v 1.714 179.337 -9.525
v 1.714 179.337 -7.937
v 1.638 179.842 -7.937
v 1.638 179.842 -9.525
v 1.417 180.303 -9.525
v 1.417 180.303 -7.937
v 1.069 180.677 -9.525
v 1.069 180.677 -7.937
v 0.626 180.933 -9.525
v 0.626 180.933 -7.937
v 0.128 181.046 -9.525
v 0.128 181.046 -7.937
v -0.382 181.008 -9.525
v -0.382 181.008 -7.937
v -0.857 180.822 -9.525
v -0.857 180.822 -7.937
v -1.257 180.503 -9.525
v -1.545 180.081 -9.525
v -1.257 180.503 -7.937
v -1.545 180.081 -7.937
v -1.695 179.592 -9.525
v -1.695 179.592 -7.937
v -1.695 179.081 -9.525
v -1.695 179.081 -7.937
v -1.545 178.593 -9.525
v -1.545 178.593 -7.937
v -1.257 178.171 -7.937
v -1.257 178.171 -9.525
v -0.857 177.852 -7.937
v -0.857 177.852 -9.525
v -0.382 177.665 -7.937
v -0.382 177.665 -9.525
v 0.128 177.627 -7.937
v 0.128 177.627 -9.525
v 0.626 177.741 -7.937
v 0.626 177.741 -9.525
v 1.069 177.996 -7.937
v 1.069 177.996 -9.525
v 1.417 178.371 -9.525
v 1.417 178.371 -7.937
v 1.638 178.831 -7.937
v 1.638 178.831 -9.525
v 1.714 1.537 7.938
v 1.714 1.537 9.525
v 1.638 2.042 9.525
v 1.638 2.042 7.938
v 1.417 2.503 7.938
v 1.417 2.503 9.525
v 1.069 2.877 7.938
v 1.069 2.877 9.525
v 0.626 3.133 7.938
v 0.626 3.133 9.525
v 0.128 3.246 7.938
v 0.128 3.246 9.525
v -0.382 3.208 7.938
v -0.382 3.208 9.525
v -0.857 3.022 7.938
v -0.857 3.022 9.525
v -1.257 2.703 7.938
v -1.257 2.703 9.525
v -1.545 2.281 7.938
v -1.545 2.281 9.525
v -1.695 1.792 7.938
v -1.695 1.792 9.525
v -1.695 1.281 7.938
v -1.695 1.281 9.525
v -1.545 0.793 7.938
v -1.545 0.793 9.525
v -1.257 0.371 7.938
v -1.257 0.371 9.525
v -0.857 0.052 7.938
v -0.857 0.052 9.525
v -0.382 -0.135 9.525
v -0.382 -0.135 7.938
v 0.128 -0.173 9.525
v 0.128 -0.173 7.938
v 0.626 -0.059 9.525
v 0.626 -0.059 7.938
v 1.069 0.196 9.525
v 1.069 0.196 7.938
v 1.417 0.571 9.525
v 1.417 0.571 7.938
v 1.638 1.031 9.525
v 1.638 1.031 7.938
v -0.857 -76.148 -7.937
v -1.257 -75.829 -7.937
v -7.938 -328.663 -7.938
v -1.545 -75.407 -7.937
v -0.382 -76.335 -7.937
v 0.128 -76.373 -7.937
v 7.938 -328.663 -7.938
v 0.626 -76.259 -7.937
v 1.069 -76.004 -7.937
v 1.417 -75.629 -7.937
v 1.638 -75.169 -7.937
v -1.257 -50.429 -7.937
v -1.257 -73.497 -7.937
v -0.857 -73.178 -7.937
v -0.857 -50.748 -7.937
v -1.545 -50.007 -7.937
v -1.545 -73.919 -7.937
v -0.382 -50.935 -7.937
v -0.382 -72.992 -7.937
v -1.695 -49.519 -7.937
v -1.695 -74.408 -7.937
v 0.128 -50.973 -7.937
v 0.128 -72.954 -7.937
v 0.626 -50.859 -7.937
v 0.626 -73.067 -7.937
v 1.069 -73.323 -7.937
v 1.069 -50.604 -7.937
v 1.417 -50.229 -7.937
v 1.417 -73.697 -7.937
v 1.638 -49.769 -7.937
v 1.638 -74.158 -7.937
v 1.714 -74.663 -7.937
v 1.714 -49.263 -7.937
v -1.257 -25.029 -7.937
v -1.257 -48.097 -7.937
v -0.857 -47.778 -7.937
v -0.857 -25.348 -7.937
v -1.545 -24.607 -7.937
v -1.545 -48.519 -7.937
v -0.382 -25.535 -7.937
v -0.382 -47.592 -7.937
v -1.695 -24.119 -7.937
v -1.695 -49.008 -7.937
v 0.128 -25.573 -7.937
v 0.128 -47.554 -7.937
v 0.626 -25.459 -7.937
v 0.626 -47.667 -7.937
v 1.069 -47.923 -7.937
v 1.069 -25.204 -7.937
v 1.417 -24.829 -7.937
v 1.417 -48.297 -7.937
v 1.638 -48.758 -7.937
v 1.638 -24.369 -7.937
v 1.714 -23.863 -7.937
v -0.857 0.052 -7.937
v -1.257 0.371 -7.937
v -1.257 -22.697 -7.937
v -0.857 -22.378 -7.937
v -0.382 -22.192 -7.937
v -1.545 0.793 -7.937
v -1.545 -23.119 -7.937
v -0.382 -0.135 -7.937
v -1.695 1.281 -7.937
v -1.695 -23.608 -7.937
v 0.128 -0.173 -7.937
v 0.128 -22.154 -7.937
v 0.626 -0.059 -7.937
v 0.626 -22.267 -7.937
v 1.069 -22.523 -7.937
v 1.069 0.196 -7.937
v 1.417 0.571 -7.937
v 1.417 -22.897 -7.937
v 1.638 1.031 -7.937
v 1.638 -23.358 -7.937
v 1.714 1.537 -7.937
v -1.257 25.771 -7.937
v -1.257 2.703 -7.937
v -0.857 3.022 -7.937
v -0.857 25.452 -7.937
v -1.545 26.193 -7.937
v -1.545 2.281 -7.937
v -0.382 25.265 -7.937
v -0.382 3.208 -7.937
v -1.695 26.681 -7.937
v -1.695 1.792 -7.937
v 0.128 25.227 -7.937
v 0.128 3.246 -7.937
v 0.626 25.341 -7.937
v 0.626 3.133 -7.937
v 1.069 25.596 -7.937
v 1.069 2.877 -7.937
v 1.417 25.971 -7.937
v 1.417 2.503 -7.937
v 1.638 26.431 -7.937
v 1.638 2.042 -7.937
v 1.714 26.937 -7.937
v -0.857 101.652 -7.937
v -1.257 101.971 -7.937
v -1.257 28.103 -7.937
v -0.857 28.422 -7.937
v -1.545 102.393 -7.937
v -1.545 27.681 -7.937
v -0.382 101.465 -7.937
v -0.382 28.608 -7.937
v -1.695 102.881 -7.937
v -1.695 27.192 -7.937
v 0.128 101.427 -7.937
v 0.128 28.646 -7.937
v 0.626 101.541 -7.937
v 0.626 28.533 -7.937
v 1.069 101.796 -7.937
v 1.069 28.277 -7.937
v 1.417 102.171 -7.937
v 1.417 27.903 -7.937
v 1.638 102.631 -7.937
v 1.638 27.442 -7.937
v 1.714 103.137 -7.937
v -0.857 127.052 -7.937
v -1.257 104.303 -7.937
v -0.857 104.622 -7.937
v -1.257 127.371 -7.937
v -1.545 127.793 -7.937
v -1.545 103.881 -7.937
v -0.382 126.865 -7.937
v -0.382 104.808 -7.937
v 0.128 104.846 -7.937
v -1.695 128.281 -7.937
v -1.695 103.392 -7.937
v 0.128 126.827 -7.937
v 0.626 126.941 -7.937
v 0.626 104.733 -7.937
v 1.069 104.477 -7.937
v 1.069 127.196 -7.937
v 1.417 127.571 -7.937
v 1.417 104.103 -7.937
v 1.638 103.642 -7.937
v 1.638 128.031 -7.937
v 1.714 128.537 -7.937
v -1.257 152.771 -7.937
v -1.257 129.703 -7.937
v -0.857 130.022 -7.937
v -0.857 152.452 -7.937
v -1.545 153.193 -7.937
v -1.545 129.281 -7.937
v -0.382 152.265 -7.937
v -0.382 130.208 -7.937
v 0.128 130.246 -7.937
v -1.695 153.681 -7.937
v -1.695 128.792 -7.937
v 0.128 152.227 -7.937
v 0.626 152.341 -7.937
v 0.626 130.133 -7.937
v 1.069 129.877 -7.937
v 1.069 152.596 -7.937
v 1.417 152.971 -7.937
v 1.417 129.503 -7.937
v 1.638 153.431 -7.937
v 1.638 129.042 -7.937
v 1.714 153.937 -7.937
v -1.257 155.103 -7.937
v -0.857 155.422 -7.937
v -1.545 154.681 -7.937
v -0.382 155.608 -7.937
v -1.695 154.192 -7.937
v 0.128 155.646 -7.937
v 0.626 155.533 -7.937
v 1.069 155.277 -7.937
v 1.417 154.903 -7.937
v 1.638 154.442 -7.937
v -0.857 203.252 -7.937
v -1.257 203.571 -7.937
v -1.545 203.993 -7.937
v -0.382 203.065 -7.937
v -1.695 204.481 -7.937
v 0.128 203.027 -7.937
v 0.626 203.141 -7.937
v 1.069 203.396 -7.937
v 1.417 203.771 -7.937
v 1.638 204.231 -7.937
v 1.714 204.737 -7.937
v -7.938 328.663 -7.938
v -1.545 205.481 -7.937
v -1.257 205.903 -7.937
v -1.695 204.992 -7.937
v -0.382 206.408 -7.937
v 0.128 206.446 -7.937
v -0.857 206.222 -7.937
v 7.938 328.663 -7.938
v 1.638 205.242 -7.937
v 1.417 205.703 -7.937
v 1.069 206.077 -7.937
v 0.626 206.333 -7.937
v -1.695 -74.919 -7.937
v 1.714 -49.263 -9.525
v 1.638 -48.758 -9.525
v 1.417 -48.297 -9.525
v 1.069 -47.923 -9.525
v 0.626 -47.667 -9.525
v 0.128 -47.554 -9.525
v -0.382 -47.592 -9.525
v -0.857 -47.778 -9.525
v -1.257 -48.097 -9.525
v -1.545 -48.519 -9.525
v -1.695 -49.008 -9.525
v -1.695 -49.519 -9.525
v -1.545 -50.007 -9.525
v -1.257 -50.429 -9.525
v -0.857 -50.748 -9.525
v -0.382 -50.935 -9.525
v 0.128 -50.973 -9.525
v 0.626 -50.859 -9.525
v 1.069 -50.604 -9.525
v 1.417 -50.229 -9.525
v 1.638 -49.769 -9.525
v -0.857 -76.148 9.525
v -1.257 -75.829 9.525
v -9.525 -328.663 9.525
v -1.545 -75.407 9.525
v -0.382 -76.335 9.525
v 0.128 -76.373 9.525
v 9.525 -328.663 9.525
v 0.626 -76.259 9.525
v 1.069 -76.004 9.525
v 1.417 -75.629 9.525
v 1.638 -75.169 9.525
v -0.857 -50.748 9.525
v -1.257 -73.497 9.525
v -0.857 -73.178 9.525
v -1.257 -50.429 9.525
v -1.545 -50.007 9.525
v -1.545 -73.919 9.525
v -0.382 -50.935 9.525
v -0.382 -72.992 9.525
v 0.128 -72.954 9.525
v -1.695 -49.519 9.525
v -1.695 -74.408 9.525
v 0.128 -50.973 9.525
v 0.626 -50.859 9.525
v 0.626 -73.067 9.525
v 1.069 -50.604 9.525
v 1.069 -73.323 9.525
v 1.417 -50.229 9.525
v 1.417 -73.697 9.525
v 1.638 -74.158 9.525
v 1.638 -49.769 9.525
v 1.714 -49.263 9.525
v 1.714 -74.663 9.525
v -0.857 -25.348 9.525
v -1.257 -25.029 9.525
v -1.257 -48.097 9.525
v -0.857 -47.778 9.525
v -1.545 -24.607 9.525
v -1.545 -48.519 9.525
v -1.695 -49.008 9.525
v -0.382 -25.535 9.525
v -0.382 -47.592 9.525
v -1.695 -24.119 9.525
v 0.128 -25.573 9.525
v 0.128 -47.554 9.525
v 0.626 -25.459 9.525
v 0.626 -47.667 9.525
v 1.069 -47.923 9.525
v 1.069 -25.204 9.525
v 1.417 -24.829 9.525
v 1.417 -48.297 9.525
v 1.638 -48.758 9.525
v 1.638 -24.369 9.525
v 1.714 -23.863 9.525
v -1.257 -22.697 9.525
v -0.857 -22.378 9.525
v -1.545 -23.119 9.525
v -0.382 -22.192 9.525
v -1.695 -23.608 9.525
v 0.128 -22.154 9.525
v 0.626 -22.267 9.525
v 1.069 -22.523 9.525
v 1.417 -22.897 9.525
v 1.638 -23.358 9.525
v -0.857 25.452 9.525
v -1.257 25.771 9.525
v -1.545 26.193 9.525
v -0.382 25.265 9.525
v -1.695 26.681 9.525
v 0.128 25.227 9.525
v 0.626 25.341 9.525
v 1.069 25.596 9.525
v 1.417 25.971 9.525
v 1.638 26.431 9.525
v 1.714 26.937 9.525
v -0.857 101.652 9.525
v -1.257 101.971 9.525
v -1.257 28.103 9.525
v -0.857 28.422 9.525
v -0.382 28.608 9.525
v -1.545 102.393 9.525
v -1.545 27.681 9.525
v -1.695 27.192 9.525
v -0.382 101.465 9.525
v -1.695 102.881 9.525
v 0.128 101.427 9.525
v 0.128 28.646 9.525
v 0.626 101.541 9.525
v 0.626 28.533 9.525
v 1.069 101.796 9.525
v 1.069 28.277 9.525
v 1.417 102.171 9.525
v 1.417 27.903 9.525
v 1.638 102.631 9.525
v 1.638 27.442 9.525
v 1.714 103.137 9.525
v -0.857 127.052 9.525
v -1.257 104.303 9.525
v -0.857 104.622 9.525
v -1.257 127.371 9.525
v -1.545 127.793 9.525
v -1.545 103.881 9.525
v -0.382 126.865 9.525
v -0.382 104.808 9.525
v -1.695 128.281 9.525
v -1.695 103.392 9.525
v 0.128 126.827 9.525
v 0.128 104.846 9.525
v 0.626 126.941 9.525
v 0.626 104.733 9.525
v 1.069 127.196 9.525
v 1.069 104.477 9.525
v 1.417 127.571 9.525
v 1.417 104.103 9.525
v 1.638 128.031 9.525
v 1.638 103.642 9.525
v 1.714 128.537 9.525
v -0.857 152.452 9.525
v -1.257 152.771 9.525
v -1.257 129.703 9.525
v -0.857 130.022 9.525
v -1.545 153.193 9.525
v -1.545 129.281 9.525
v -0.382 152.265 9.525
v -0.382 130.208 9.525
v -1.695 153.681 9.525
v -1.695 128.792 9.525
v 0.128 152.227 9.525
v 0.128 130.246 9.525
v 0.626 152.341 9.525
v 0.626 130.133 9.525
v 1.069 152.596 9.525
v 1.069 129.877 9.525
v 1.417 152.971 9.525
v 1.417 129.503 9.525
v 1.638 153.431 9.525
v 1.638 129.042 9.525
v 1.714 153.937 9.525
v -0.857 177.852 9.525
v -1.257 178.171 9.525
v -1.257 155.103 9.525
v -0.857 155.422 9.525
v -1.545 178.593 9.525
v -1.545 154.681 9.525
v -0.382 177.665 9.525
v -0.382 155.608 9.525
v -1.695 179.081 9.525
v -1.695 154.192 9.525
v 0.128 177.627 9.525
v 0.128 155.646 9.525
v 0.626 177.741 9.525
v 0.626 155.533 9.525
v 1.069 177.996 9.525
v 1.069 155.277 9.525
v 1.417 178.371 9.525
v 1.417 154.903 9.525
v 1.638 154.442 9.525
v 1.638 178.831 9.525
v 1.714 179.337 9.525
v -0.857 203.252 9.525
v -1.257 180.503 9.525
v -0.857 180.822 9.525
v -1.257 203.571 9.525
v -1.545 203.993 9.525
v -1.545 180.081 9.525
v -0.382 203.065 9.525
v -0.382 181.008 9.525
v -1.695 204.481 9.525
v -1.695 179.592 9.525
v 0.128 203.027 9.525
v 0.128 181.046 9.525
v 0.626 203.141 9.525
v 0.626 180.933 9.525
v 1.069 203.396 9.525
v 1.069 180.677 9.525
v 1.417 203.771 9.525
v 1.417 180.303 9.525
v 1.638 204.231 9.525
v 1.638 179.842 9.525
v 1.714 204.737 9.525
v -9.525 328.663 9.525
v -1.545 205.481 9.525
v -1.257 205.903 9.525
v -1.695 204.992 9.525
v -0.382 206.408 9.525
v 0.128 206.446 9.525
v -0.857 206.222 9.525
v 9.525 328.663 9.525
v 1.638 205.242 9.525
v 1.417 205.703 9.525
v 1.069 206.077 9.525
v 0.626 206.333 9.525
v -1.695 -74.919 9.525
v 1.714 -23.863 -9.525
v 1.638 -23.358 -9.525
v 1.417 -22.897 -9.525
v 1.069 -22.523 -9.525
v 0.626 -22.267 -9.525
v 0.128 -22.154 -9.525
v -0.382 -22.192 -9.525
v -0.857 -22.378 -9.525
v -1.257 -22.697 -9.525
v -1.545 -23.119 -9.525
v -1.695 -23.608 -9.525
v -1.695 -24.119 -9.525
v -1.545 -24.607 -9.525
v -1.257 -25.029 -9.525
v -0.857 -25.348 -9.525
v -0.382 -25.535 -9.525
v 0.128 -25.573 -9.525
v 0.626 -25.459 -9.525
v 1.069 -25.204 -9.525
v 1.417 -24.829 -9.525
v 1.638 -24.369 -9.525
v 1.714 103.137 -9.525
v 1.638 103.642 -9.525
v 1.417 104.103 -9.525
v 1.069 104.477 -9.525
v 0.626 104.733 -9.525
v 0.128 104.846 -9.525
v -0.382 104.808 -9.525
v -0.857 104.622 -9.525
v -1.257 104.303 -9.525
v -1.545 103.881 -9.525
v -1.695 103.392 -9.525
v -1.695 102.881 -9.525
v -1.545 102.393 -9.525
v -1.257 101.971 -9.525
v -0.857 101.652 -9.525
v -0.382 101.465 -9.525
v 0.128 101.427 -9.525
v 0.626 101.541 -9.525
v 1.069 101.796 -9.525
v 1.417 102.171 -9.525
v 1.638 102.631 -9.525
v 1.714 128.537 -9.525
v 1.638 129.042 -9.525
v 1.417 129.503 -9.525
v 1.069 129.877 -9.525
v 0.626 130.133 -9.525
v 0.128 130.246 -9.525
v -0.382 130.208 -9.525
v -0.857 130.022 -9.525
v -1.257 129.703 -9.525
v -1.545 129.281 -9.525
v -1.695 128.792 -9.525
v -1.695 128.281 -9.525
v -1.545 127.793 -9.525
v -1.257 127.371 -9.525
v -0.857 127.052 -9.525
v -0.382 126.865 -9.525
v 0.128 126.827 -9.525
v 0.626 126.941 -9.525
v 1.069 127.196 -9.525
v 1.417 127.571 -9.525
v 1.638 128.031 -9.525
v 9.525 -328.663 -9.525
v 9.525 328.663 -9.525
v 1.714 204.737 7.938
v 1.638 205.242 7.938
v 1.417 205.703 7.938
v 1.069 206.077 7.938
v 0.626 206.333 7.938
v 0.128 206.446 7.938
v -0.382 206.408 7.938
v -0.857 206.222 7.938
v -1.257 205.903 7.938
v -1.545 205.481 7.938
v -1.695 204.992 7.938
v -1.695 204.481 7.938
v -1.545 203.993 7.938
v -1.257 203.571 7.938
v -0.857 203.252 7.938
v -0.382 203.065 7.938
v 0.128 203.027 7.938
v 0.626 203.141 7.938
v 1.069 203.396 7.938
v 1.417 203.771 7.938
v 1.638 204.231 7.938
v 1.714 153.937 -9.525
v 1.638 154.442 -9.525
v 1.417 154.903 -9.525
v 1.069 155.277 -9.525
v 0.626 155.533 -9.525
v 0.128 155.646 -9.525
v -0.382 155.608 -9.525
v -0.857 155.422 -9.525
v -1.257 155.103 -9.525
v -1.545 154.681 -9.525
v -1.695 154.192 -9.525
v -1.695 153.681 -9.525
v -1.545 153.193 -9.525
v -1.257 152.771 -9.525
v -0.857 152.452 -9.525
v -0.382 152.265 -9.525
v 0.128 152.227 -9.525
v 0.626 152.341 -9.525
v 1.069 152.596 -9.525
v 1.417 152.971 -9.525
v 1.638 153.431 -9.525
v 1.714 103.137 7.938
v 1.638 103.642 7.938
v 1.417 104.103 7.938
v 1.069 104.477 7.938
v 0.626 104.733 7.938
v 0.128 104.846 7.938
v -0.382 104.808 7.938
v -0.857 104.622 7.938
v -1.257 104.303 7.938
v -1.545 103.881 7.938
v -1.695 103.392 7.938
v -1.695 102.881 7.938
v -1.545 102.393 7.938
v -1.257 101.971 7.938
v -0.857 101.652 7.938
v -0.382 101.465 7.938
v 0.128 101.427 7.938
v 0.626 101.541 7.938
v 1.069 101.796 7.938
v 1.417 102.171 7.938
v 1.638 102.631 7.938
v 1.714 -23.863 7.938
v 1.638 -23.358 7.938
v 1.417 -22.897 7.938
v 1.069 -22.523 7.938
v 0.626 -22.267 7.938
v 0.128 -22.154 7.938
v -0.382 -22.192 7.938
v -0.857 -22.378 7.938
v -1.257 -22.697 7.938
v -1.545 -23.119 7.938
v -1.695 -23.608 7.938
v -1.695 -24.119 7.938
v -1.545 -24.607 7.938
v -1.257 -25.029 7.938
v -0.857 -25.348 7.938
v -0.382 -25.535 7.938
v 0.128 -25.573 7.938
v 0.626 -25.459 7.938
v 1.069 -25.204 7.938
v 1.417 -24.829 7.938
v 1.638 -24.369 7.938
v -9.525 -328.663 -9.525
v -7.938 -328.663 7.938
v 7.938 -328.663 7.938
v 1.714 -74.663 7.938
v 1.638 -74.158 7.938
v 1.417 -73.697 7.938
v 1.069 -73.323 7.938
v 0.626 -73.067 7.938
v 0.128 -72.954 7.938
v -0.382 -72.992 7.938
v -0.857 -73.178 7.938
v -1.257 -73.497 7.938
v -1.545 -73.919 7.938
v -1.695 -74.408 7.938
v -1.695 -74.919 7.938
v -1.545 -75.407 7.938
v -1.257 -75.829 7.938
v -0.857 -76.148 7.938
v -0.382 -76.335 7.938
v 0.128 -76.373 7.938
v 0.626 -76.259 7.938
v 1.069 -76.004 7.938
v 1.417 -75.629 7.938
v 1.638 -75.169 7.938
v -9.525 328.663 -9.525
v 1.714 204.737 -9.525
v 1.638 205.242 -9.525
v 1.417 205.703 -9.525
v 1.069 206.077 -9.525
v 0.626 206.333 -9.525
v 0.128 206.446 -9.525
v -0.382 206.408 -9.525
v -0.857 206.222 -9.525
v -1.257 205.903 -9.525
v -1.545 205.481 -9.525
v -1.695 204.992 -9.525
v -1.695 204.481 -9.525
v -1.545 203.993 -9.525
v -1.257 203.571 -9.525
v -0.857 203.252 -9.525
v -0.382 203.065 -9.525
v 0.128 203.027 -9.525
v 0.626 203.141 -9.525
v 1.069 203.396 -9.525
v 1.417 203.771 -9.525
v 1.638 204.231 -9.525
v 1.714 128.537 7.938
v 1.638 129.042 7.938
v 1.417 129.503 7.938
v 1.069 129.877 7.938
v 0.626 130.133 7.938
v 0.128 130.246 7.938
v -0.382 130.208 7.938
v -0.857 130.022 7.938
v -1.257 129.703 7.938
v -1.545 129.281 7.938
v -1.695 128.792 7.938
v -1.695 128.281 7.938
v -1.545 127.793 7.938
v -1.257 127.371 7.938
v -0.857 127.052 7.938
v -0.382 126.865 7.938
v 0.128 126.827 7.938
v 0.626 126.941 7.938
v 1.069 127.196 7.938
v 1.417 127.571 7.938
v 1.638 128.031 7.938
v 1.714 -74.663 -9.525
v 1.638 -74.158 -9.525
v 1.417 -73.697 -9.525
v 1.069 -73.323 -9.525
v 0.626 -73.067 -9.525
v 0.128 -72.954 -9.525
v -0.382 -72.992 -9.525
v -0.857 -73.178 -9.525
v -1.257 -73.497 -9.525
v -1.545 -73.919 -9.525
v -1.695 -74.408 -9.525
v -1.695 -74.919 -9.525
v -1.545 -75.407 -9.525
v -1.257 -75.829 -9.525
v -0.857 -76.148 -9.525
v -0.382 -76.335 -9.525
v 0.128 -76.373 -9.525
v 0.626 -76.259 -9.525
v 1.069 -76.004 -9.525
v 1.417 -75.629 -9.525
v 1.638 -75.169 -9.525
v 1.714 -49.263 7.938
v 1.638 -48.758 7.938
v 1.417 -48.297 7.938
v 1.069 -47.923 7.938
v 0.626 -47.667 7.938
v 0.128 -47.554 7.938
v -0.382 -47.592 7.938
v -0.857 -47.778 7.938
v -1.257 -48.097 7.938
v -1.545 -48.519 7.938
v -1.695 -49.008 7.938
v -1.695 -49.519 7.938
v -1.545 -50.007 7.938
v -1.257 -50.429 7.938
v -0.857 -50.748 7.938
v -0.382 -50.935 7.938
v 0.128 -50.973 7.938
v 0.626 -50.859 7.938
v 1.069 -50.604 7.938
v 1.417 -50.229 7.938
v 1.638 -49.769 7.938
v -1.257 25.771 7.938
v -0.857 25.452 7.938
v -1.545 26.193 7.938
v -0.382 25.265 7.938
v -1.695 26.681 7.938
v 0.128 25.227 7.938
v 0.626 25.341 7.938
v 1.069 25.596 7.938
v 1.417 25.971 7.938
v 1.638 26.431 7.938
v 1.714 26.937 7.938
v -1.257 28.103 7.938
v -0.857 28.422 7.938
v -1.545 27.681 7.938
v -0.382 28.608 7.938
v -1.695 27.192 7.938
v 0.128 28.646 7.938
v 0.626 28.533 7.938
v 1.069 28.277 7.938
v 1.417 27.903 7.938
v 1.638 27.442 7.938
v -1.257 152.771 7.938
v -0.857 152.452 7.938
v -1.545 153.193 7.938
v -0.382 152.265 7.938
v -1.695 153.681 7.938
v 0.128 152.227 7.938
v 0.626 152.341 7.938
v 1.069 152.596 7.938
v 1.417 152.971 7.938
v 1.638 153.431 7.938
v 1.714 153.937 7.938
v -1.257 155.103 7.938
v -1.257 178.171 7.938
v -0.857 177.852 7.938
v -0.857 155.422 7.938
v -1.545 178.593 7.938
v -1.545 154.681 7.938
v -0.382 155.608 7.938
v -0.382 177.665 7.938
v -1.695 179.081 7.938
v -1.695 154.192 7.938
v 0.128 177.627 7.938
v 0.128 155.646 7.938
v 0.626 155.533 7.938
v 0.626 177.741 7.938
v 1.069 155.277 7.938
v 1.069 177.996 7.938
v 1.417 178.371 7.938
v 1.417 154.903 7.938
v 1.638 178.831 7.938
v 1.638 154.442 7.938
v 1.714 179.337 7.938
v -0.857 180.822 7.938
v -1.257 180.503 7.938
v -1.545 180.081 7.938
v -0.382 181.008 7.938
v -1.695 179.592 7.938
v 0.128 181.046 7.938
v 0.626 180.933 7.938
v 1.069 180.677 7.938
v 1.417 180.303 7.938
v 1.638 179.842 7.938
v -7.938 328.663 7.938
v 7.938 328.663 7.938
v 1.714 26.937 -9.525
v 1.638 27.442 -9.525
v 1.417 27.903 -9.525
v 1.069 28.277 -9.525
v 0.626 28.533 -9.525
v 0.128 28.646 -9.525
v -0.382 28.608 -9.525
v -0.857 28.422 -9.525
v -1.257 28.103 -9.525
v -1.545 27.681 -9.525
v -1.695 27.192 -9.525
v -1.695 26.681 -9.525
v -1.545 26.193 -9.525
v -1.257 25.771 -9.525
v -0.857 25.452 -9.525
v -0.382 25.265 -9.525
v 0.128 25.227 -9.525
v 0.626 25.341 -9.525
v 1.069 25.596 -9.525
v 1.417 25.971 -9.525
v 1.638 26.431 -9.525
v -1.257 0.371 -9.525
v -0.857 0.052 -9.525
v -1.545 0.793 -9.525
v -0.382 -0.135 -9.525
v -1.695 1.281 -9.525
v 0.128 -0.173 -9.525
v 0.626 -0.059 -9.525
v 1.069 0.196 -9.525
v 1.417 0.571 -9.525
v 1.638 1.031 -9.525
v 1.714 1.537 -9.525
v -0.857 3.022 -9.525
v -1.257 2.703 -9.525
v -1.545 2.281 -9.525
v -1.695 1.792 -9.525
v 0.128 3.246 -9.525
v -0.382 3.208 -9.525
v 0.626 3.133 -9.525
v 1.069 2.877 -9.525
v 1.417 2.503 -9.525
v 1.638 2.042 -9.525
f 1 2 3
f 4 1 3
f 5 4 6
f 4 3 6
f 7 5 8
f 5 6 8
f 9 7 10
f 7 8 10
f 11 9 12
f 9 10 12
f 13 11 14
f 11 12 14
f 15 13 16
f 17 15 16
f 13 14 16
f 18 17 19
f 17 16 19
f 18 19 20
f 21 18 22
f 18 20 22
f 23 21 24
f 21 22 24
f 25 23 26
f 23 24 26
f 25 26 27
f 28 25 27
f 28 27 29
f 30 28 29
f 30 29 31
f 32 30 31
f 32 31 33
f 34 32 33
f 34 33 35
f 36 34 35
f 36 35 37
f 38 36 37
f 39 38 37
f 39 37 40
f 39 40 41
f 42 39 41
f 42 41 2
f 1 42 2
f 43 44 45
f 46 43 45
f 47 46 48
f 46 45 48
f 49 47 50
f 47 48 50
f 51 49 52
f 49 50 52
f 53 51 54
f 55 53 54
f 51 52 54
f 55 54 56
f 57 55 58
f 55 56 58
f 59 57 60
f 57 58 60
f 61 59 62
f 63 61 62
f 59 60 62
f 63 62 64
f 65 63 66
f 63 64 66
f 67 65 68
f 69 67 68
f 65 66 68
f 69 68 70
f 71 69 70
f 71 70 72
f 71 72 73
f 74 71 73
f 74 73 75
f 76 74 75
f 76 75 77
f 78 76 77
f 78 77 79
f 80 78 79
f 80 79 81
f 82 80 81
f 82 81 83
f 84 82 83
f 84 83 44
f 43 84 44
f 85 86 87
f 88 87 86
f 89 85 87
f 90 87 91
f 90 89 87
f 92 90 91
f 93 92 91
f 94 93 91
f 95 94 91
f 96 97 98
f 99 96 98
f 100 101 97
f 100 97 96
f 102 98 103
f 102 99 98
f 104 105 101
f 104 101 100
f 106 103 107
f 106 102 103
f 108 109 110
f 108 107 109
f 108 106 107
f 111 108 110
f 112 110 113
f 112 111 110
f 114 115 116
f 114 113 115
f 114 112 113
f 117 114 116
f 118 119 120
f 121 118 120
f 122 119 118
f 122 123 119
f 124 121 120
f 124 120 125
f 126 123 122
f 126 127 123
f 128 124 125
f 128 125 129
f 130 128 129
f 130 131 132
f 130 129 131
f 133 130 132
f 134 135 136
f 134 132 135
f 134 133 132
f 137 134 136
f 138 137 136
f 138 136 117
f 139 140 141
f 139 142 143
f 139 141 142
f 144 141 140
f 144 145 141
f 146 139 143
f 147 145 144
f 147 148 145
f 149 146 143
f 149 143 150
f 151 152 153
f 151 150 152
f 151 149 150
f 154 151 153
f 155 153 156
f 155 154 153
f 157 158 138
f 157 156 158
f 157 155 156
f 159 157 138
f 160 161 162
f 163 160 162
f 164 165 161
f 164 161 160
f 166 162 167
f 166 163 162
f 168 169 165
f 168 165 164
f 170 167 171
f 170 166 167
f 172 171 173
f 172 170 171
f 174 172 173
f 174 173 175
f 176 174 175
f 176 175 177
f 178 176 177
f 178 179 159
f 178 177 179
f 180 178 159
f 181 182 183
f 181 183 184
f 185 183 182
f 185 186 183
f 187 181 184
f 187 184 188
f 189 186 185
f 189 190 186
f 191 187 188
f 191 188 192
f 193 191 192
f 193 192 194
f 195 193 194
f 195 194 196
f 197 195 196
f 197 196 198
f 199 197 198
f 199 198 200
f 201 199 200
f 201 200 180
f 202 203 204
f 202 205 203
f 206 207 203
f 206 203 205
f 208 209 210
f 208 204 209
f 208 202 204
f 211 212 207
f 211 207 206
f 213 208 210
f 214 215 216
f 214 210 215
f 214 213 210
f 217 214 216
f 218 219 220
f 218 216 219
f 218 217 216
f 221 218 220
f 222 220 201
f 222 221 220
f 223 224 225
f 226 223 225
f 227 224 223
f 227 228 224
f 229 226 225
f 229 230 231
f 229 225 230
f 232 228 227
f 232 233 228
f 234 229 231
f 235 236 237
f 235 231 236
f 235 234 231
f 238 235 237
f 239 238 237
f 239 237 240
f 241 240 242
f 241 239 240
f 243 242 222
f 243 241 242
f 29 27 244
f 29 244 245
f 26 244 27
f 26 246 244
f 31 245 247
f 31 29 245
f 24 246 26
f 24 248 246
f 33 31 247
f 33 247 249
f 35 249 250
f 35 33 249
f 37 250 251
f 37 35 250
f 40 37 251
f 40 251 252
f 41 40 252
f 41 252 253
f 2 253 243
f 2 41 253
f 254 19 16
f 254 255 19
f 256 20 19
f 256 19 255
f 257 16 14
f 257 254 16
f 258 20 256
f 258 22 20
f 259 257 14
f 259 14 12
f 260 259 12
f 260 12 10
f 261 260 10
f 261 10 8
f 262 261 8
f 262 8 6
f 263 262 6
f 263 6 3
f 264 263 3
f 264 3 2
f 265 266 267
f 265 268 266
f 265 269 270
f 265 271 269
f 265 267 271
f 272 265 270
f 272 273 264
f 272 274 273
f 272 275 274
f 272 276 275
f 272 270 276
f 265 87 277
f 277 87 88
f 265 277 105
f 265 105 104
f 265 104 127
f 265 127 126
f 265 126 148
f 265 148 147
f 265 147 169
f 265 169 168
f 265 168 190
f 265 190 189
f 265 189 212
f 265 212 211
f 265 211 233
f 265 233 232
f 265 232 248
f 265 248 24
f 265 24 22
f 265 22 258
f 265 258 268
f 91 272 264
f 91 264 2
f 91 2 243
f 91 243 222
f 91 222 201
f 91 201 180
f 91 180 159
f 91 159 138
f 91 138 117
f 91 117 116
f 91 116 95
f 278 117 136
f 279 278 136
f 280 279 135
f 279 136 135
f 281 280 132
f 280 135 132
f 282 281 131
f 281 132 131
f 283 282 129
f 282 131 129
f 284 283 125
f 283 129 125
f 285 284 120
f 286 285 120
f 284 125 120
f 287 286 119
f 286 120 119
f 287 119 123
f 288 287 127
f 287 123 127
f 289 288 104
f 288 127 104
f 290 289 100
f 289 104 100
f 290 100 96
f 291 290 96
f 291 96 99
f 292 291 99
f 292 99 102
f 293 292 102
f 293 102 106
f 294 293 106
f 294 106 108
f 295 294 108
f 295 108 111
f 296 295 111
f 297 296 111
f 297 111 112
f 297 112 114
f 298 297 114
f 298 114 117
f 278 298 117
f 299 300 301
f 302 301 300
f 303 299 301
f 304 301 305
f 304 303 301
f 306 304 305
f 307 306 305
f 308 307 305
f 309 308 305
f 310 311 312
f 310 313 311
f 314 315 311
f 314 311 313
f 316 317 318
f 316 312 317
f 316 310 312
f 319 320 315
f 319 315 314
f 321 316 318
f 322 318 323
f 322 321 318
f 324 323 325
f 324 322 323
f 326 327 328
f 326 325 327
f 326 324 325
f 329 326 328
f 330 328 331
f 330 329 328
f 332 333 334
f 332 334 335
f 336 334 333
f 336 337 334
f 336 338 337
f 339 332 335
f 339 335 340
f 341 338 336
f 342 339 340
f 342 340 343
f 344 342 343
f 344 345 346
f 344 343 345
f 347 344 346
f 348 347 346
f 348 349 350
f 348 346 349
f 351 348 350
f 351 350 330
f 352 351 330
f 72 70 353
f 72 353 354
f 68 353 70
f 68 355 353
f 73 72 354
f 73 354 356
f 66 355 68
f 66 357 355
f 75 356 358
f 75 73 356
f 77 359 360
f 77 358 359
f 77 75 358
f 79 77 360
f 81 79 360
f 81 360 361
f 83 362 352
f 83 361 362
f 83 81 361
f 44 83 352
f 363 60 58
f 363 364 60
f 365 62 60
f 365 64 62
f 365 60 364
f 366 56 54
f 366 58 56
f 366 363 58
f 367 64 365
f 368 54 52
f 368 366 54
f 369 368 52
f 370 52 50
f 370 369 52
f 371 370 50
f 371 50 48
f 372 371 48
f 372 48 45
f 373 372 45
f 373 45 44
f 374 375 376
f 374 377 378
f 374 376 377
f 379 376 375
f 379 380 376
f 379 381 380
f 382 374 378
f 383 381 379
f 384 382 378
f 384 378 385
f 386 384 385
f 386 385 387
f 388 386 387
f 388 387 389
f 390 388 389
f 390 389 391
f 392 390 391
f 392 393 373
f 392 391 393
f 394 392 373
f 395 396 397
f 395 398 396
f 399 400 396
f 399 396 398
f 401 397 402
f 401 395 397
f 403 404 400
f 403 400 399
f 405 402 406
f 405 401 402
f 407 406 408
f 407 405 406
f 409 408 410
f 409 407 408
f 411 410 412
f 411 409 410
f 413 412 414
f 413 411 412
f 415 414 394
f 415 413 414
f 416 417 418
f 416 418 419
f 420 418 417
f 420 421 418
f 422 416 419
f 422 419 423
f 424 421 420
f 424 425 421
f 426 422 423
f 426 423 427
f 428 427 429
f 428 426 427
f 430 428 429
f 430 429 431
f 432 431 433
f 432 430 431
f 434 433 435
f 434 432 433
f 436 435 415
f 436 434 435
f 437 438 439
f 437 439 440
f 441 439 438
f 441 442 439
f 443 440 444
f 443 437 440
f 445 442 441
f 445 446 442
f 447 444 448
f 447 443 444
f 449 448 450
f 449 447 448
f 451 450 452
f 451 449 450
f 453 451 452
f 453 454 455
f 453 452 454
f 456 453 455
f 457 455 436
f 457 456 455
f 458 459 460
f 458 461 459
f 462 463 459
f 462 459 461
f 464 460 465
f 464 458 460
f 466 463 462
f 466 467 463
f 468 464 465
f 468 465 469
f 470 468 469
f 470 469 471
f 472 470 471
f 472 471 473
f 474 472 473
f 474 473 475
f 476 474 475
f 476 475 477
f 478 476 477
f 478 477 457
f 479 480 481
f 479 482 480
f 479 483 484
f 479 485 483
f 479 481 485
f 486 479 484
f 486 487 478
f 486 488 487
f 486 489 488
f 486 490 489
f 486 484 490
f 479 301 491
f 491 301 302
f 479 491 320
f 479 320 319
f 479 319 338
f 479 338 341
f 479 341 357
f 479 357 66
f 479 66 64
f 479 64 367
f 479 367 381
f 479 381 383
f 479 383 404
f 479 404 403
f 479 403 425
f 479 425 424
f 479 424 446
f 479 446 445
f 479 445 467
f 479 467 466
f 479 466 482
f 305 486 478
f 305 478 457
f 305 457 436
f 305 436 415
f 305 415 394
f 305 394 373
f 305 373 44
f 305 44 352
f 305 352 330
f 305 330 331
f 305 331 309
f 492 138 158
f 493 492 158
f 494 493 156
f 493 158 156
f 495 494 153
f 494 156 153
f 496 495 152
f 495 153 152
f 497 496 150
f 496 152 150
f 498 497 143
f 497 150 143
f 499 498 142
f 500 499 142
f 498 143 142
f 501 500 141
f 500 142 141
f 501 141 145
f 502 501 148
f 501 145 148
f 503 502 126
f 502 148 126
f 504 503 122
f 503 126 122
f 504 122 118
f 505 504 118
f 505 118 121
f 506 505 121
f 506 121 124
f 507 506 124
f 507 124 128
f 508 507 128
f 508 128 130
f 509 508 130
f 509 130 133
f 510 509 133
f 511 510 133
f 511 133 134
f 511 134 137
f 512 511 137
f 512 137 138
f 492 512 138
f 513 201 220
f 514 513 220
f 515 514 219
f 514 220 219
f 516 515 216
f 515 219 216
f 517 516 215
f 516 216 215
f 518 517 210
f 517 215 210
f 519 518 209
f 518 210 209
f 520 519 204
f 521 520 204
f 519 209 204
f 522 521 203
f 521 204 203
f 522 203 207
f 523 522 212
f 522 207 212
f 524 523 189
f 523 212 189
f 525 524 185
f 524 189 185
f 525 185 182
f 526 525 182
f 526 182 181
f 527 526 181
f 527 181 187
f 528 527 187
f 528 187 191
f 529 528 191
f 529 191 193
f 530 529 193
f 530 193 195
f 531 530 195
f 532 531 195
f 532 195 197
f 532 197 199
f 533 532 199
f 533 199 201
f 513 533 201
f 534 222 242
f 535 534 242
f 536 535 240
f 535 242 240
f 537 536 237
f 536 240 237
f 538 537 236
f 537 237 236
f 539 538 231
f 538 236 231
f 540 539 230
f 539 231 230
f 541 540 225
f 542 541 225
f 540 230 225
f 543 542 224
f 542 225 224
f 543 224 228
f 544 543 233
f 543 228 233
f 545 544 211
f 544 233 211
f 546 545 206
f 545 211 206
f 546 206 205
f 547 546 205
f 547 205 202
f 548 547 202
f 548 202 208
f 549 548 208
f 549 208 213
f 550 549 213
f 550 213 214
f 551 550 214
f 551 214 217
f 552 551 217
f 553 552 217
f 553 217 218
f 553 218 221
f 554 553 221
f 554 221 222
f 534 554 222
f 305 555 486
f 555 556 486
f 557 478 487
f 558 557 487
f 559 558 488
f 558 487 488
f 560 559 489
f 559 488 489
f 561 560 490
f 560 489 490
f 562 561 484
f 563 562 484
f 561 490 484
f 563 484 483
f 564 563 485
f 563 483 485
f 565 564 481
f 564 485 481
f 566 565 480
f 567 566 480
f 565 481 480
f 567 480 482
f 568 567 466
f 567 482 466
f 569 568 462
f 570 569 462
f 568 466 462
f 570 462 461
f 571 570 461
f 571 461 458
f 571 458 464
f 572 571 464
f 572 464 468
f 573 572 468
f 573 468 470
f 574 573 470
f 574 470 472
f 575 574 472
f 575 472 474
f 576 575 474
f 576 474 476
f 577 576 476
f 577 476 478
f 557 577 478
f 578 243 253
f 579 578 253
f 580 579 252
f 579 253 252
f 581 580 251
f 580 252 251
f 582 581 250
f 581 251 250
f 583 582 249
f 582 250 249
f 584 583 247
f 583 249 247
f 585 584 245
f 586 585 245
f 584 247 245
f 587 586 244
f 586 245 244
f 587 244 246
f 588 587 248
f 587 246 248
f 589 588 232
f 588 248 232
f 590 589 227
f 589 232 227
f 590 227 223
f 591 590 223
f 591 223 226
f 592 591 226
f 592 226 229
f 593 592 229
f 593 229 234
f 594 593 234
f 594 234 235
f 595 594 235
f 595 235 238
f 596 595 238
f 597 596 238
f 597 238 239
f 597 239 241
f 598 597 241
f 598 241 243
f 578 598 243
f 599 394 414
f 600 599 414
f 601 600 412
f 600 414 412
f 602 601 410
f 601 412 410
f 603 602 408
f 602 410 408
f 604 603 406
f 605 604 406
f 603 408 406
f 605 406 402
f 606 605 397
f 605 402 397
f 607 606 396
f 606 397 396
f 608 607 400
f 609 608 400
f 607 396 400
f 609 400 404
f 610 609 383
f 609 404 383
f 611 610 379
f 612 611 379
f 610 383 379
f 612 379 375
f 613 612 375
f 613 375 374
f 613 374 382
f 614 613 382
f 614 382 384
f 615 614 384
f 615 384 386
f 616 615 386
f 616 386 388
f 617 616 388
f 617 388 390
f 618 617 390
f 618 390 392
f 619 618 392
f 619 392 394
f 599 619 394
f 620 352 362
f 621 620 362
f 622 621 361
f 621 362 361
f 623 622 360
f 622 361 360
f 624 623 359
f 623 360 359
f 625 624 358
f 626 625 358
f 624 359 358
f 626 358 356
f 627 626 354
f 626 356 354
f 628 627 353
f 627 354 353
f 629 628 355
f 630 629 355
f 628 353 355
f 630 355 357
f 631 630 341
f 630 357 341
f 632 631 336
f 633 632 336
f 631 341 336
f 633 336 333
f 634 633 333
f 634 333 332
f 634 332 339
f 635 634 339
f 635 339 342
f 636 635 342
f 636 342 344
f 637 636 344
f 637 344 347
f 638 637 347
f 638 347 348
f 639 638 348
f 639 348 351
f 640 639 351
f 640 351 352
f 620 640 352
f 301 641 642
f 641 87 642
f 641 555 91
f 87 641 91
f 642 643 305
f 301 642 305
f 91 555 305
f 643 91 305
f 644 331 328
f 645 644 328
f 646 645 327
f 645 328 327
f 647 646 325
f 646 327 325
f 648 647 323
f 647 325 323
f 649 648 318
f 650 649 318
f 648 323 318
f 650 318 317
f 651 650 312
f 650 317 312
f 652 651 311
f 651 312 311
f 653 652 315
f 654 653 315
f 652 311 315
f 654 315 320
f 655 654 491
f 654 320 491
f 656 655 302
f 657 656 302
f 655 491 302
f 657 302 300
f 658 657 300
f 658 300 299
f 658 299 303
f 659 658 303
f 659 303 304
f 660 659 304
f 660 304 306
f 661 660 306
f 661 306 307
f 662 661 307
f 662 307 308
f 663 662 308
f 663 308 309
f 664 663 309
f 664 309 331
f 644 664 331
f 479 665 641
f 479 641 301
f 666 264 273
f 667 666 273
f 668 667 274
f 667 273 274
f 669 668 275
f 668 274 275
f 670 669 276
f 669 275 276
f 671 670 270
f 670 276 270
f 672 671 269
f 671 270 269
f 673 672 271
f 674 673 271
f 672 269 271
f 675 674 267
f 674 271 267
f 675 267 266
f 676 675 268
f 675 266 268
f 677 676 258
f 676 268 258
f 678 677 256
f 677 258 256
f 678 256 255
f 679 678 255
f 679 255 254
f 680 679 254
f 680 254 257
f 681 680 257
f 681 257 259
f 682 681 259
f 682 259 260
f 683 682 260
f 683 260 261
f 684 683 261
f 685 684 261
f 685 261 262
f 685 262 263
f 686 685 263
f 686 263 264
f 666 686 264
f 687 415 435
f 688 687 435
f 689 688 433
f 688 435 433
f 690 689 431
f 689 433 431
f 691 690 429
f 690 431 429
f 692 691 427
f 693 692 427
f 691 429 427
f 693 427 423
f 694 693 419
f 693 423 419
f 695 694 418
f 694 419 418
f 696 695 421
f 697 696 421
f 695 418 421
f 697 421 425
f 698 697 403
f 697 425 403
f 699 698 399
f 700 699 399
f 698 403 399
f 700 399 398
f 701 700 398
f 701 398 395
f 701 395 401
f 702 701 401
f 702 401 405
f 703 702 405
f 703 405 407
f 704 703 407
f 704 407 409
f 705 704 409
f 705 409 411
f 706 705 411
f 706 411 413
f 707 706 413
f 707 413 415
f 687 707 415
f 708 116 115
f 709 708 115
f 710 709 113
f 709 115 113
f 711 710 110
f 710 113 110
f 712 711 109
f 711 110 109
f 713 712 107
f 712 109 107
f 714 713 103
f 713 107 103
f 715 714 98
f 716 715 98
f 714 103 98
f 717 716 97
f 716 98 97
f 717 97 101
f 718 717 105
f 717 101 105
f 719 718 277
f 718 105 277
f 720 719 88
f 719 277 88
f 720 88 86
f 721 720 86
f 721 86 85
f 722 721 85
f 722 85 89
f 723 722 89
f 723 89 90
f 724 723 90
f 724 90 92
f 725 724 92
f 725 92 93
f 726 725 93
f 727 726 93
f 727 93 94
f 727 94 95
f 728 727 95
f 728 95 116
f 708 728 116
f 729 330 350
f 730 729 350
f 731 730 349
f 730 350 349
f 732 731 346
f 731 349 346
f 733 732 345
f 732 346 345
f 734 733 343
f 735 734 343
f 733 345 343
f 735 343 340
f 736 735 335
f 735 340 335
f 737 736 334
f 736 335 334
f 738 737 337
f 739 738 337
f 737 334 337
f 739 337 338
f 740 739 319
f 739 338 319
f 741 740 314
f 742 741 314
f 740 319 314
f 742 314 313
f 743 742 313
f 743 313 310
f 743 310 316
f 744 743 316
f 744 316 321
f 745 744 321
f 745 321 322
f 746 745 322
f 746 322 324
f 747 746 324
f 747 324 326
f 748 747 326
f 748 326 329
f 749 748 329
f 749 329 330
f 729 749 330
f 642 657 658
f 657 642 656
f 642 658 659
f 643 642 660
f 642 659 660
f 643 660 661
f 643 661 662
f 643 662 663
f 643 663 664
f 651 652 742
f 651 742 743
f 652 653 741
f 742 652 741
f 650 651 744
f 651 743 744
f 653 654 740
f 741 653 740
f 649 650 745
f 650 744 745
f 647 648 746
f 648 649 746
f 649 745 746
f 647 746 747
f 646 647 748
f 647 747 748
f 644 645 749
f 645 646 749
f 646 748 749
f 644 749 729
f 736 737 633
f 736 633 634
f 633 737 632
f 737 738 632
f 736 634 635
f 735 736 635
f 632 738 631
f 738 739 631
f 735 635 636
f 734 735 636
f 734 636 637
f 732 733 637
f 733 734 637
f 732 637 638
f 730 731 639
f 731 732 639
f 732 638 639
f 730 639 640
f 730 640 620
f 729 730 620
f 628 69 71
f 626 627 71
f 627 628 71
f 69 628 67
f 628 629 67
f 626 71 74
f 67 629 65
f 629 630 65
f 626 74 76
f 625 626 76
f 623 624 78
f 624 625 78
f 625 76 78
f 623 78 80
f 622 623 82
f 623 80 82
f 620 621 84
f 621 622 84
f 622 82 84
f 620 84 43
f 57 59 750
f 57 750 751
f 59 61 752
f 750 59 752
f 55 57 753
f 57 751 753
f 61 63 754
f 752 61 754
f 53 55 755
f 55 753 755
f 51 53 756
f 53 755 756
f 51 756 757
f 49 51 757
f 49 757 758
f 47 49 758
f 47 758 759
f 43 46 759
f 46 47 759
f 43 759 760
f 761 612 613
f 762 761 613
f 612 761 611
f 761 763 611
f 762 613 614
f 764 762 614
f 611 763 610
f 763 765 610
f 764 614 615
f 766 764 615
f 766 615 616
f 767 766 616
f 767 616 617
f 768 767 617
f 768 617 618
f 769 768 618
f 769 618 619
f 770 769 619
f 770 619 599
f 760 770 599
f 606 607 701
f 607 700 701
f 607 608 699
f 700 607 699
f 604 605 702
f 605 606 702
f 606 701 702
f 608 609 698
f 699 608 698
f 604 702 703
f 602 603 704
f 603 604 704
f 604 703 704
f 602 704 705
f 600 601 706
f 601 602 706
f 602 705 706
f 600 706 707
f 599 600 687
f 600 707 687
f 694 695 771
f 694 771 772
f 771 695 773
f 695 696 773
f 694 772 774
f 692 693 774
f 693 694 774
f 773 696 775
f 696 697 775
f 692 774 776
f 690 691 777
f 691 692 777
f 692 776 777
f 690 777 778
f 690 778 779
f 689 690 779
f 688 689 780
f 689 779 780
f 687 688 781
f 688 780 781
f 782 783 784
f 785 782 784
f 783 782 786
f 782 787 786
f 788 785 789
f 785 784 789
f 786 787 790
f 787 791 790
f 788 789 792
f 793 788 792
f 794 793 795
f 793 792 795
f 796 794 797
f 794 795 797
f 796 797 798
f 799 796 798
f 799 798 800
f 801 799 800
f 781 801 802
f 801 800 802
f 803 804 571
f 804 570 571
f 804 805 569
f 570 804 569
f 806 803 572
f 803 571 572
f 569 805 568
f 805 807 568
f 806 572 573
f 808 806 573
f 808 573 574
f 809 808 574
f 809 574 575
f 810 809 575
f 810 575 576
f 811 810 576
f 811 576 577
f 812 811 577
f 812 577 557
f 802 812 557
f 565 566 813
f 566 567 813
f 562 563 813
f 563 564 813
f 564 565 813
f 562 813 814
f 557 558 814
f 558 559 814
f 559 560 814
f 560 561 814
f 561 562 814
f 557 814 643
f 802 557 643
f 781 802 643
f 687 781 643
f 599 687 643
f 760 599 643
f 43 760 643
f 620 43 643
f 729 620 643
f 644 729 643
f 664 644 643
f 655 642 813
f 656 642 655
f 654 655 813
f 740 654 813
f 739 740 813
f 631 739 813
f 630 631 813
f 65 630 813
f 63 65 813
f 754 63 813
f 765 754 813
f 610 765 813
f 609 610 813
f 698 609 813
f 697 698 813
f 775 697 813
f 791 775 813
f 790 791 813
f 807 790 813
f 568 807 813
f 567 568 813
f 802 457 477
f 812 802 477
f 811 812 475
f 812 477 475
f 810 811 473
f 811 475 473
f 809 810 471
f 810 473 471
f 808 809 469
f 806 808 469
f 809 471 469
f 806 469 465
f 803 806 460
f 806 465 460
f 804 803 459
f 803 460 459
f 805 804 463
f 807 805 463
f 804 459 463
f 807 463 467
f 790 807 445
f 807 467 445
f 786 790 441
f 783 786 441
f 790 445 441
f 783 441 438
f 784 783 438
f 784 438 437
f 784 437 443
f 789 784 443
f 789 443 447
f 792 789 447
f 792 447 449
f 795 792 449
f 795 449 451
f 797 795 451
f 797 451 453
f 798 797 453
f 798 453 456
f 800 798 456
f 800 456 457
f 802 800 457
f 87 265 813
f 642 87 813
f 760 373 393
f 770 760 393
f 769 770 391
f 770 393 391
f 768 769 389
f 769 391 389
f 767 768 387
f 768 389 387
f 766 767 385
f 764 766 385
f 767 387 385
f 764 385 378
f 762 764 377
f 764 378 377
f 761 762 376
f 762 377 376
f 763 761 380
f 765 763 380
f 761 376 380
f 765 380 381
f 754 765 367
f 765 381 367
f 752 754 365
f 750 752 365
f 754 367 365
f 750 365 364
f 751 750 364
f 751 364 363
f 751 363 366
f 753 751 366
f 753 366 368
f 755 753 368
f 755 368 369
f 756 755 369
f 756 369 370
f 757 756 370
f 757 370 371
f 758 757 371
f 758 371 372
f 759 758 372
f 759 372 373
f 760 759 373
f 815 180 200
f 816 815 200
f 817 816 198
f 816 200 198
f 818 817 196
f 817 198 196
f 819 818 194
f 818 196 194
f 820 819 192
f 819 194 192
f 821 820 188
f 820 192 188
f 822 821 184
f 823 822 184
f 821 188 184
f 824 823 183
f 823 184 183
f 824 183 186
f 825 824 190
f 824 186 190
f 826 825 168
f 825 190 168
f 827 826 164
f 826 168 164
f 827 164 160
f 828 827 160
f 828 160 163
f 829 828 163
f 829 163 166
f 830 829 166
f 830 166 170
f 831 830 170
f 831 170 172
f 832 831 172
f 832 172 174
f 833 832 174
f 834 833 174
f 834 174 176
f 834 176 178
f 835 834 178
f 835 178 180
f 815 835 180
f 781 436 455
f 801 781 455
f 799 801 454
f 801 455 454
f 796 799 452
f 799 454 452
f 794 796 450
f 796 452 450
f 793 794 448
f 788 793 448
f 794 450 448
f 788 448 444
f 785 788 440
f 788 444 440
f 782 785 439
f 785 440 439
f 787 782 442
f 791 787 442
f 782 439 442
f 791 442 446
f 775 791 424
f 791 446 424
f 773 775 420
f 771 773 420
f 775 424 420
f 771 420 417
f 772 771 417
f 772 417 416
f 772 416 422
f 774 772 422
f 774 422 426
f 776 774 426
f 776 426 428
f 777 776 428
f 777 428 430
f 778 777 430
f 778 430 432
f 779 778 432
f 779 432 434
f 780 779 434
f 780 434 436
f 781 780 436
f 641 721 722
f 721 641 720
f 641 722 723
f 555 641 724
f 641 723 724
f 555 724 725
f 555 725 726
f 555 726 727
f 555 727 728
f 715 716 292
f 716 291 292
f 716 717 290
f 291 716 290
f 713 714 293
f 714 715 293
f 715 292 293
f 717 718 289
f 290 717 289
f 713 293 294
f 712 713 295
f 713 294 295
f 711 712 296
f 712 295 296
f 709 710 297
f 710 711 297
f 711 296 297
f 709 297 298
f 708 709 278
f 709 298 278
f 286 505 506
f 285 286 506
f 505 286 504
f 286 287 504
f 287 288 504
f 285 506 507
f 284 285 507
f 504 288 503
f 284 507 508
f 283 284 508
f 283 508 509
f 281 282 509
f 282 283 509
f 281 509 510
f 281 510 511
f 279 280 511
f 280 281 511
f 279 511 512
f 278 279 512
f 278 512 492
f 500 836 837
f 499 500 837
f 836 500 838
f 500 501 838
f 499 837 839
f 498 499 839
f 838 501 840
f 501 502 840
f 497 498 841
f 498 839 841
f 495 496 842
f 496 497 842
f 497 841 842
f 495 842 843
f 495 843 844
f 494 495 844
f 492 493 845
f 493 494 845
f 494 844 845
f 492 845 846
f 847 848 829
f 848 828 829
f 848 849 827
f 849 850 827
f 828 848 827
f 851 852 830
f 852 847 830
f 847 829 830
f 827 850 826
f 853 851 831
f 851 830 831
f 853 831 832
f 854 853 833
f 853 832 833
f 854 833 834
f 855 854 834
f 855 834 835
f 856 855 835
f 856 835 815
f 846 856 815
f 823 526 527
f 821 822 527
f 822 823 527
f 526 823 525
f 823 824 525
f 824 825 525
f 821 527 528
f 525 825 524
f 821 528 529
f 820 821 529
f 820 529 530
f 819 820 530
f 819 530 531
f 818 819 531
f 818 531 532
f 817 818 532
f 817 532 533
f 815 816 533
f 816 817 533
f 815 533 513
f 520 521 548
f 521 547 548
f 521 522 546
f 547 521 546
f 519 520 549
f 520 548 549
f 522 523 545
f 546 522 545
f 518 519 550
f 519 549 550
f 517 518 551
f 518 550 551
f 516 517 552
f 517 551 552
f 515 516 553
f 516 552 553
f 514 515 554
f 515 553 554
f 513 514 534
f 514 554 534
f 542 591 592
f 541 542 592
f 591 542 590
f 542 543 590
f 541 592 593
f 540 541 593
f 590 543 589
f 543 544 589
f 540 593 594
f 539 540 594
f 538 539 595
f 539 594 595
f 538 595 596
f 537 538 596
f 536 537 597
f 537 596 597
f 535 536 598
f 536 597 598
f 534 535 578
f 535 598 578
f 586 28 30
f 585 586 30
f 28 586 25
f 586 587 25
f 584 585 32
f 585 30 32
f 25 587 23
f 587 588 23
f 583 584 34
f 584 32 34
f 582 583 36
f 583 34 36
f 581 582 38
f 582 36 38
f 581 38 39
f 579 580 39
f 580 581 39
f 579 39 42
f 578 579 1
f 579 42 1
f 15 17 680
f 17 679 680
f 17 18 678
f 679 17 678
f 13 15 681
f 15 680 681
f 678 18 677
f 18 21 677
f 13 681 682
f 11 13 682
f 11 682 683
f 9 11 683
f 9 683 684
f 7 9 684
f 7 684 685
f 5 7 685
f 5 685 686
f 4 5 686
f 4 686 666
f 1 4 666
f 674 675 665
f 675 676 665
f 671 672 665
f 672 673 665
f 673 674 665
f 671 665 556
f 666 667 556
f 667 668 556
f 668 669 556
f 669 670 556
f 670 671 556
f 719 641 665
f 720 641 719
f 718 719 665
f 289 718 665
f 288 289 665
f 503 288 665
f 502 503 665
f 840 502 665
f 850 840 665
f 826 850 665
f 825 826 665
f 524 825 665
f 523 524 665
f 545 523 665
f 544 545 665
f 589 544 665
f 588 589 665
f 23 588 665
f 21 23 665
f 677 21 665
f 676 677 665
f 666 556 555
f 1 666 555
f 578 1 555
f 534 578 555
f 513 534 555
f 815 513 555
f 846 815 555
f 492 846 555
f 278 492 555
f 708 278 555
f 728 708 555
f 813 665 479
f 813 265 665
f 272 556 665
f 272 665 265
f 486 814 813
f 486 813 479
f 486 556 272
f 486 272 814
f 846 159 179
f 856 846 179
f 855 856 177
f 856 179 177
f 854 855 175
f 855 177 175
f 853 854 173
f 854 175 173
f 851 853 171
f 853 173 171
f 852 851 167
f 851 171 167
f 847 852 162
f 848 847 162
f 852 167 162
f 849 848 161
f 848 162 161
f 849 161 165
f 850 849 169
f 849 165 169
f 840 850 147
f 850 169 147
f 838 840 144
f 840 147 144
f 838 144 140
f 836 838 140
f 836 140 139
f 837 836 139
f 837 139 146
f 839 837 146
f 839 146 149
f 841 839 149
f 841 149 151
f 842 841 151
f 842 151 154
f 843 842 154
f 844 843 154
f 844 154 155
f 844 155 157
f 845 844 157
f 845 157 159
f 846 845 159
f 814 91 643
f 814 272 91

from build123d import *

# Parameters (mm, degrees)
SKETCH1_W                 = 19.05
SKETCH1_H                 = 19.05
SKETCH1_W_2               = 15.875
SKETCH1_H_2               = 15.875
BOSS_EXTRUDE1_DEPTH       = 328.6633
SKETCH2_R                 = 1.7145
CUT_EXTRUDE1_DEPTH        = 330.352687695
LPATTERN1_COUNT           = 5
LPATTERN1_PITCH           = 25.4
LPATTERN2_COUNT           = 2
LPATTERN2_PITCH           = 177.8
LPATTERN2_COPY_1_SKETCH_R = 1.7145
LPATTERN2_COPY_1_DEPTH    = 330.352687695
LPATTERN2_COPY_2_SKETCH_R = 1.7145
LPATTERN2_COPY_2_DEPTH    = 330.352687695
LPATTERN2_COPY_3_SKETCH_R = 1.7145
LPATTERN2_COPY_3_DEPTH    = 330.352687695
LPATTERN2_COPY_4_SKETCH_R = 1.7145
LPATTERN2_COPY_4_DEPTH    = 330.352687695


with BuildPart() as part:
    # Sketch1 → Boss-Extrude1 (new, symmetric)
    with BuildSketch(Plane.ZX):
        Rectangle(SKETCH1_W, SKETCH1_H)
        Rectangle(SKETCH1_W_2, SKETCH1_H_2, mode=Mode.SUBTRACT)
    extrude(amount=BOSS_EXTRUDE1_DEPTH, both=True)

    # Sketch2 → Cut-Extrude1 (cut, through all)
    with BuildSketch(Plane.XY.offset(9.525)):
        with Locations((0, -74.6633)):
            Circle(SKETCH2_R)
    cut_extrude1 = extrude(amount=-CUT_EXTRUDE1_DEPTH, mode=Mode.SUBTRACT)

    # LPattern1: Cut-Extrude1 ×5
    with Locations(*[(0, i * LPATTERN1_PITCH, 0) for i in range(1, LPATTERN1_COUNT)]):
        add(cut_extrude1, mode=Mode.SUBTRACT)

    # LPattern2: Cut-Extrude1 ×2
    with Locations(*[(0, i * LPATTERN2_PITCH, 0) for i in range(1, LPATTERN2_COUNT)]):
        add(cut_extrude1, mode=Mode.SUBTRACT)

    # LPattern2 copy 1 sketch → LPattern2 copy 1 (cut, through all)
    with BuildSketch(Plane(origin=(0, 203.2, 9.525), x_dir=(1, 0, 0), z_dir=(0, 0, 1))):
        with Locations((0, -74.6633)):
            Circle(LPATTERN2_COPY_1_SKETCH_R)
    extrude(amount=-LPATTERN2_COPY_1_DEPTH, mode=Mode.SUBTRACT)

    # LPattern2 copy 2 sketch → LPattern2 copy 2 (cut, through all)
    with BuildSketch(Plane(origin=(0, 228.6, 9.525), x_dir=(1, 0, 0), z_dir=(0, 0, 1))):
        with Locations((0, -74.6633)):
            Circle(LPATTERN2_COPY_2_SKETCH_R)
    extrude(amount=-LPATTERN2_COPY_2_DEPTH, mode=Mode.SUBTRACT)

    # LPattern2 copy 3 sketch → LPattern2 copy 3 (cut, through all)
    with BuildSketch(Plane(origin=(0, 254, 9.525), x_dir=(1, 0, 0), z_dir=(0, 0, 1))):
        with Locations((0, -74.6633)):
            Circle(LPATTERN2_COPY_3_SKETCH_R)
    extrude(amount=-LPATTERN2_COPY_3_DEPTH, mode=Mode.SUBTRACT)

    # LPattern2 copy 4 sketch → LPattern2 copy 4 (cut, through all)
    with BuildSketch(Plane(origin=(0, 279.4, 9.525), x_dir=(1, 0, 0), z_dir=(0, 0, 1))):
        with Locations((0, -74.6633)):
            Circle(LPATTERN2_COPY_4_SKETCH_R)
    extrude(amount=-LPATTERN2_COPY_4_DEPTH, mode=Mode.SUBTRACT)


solid = part.part
